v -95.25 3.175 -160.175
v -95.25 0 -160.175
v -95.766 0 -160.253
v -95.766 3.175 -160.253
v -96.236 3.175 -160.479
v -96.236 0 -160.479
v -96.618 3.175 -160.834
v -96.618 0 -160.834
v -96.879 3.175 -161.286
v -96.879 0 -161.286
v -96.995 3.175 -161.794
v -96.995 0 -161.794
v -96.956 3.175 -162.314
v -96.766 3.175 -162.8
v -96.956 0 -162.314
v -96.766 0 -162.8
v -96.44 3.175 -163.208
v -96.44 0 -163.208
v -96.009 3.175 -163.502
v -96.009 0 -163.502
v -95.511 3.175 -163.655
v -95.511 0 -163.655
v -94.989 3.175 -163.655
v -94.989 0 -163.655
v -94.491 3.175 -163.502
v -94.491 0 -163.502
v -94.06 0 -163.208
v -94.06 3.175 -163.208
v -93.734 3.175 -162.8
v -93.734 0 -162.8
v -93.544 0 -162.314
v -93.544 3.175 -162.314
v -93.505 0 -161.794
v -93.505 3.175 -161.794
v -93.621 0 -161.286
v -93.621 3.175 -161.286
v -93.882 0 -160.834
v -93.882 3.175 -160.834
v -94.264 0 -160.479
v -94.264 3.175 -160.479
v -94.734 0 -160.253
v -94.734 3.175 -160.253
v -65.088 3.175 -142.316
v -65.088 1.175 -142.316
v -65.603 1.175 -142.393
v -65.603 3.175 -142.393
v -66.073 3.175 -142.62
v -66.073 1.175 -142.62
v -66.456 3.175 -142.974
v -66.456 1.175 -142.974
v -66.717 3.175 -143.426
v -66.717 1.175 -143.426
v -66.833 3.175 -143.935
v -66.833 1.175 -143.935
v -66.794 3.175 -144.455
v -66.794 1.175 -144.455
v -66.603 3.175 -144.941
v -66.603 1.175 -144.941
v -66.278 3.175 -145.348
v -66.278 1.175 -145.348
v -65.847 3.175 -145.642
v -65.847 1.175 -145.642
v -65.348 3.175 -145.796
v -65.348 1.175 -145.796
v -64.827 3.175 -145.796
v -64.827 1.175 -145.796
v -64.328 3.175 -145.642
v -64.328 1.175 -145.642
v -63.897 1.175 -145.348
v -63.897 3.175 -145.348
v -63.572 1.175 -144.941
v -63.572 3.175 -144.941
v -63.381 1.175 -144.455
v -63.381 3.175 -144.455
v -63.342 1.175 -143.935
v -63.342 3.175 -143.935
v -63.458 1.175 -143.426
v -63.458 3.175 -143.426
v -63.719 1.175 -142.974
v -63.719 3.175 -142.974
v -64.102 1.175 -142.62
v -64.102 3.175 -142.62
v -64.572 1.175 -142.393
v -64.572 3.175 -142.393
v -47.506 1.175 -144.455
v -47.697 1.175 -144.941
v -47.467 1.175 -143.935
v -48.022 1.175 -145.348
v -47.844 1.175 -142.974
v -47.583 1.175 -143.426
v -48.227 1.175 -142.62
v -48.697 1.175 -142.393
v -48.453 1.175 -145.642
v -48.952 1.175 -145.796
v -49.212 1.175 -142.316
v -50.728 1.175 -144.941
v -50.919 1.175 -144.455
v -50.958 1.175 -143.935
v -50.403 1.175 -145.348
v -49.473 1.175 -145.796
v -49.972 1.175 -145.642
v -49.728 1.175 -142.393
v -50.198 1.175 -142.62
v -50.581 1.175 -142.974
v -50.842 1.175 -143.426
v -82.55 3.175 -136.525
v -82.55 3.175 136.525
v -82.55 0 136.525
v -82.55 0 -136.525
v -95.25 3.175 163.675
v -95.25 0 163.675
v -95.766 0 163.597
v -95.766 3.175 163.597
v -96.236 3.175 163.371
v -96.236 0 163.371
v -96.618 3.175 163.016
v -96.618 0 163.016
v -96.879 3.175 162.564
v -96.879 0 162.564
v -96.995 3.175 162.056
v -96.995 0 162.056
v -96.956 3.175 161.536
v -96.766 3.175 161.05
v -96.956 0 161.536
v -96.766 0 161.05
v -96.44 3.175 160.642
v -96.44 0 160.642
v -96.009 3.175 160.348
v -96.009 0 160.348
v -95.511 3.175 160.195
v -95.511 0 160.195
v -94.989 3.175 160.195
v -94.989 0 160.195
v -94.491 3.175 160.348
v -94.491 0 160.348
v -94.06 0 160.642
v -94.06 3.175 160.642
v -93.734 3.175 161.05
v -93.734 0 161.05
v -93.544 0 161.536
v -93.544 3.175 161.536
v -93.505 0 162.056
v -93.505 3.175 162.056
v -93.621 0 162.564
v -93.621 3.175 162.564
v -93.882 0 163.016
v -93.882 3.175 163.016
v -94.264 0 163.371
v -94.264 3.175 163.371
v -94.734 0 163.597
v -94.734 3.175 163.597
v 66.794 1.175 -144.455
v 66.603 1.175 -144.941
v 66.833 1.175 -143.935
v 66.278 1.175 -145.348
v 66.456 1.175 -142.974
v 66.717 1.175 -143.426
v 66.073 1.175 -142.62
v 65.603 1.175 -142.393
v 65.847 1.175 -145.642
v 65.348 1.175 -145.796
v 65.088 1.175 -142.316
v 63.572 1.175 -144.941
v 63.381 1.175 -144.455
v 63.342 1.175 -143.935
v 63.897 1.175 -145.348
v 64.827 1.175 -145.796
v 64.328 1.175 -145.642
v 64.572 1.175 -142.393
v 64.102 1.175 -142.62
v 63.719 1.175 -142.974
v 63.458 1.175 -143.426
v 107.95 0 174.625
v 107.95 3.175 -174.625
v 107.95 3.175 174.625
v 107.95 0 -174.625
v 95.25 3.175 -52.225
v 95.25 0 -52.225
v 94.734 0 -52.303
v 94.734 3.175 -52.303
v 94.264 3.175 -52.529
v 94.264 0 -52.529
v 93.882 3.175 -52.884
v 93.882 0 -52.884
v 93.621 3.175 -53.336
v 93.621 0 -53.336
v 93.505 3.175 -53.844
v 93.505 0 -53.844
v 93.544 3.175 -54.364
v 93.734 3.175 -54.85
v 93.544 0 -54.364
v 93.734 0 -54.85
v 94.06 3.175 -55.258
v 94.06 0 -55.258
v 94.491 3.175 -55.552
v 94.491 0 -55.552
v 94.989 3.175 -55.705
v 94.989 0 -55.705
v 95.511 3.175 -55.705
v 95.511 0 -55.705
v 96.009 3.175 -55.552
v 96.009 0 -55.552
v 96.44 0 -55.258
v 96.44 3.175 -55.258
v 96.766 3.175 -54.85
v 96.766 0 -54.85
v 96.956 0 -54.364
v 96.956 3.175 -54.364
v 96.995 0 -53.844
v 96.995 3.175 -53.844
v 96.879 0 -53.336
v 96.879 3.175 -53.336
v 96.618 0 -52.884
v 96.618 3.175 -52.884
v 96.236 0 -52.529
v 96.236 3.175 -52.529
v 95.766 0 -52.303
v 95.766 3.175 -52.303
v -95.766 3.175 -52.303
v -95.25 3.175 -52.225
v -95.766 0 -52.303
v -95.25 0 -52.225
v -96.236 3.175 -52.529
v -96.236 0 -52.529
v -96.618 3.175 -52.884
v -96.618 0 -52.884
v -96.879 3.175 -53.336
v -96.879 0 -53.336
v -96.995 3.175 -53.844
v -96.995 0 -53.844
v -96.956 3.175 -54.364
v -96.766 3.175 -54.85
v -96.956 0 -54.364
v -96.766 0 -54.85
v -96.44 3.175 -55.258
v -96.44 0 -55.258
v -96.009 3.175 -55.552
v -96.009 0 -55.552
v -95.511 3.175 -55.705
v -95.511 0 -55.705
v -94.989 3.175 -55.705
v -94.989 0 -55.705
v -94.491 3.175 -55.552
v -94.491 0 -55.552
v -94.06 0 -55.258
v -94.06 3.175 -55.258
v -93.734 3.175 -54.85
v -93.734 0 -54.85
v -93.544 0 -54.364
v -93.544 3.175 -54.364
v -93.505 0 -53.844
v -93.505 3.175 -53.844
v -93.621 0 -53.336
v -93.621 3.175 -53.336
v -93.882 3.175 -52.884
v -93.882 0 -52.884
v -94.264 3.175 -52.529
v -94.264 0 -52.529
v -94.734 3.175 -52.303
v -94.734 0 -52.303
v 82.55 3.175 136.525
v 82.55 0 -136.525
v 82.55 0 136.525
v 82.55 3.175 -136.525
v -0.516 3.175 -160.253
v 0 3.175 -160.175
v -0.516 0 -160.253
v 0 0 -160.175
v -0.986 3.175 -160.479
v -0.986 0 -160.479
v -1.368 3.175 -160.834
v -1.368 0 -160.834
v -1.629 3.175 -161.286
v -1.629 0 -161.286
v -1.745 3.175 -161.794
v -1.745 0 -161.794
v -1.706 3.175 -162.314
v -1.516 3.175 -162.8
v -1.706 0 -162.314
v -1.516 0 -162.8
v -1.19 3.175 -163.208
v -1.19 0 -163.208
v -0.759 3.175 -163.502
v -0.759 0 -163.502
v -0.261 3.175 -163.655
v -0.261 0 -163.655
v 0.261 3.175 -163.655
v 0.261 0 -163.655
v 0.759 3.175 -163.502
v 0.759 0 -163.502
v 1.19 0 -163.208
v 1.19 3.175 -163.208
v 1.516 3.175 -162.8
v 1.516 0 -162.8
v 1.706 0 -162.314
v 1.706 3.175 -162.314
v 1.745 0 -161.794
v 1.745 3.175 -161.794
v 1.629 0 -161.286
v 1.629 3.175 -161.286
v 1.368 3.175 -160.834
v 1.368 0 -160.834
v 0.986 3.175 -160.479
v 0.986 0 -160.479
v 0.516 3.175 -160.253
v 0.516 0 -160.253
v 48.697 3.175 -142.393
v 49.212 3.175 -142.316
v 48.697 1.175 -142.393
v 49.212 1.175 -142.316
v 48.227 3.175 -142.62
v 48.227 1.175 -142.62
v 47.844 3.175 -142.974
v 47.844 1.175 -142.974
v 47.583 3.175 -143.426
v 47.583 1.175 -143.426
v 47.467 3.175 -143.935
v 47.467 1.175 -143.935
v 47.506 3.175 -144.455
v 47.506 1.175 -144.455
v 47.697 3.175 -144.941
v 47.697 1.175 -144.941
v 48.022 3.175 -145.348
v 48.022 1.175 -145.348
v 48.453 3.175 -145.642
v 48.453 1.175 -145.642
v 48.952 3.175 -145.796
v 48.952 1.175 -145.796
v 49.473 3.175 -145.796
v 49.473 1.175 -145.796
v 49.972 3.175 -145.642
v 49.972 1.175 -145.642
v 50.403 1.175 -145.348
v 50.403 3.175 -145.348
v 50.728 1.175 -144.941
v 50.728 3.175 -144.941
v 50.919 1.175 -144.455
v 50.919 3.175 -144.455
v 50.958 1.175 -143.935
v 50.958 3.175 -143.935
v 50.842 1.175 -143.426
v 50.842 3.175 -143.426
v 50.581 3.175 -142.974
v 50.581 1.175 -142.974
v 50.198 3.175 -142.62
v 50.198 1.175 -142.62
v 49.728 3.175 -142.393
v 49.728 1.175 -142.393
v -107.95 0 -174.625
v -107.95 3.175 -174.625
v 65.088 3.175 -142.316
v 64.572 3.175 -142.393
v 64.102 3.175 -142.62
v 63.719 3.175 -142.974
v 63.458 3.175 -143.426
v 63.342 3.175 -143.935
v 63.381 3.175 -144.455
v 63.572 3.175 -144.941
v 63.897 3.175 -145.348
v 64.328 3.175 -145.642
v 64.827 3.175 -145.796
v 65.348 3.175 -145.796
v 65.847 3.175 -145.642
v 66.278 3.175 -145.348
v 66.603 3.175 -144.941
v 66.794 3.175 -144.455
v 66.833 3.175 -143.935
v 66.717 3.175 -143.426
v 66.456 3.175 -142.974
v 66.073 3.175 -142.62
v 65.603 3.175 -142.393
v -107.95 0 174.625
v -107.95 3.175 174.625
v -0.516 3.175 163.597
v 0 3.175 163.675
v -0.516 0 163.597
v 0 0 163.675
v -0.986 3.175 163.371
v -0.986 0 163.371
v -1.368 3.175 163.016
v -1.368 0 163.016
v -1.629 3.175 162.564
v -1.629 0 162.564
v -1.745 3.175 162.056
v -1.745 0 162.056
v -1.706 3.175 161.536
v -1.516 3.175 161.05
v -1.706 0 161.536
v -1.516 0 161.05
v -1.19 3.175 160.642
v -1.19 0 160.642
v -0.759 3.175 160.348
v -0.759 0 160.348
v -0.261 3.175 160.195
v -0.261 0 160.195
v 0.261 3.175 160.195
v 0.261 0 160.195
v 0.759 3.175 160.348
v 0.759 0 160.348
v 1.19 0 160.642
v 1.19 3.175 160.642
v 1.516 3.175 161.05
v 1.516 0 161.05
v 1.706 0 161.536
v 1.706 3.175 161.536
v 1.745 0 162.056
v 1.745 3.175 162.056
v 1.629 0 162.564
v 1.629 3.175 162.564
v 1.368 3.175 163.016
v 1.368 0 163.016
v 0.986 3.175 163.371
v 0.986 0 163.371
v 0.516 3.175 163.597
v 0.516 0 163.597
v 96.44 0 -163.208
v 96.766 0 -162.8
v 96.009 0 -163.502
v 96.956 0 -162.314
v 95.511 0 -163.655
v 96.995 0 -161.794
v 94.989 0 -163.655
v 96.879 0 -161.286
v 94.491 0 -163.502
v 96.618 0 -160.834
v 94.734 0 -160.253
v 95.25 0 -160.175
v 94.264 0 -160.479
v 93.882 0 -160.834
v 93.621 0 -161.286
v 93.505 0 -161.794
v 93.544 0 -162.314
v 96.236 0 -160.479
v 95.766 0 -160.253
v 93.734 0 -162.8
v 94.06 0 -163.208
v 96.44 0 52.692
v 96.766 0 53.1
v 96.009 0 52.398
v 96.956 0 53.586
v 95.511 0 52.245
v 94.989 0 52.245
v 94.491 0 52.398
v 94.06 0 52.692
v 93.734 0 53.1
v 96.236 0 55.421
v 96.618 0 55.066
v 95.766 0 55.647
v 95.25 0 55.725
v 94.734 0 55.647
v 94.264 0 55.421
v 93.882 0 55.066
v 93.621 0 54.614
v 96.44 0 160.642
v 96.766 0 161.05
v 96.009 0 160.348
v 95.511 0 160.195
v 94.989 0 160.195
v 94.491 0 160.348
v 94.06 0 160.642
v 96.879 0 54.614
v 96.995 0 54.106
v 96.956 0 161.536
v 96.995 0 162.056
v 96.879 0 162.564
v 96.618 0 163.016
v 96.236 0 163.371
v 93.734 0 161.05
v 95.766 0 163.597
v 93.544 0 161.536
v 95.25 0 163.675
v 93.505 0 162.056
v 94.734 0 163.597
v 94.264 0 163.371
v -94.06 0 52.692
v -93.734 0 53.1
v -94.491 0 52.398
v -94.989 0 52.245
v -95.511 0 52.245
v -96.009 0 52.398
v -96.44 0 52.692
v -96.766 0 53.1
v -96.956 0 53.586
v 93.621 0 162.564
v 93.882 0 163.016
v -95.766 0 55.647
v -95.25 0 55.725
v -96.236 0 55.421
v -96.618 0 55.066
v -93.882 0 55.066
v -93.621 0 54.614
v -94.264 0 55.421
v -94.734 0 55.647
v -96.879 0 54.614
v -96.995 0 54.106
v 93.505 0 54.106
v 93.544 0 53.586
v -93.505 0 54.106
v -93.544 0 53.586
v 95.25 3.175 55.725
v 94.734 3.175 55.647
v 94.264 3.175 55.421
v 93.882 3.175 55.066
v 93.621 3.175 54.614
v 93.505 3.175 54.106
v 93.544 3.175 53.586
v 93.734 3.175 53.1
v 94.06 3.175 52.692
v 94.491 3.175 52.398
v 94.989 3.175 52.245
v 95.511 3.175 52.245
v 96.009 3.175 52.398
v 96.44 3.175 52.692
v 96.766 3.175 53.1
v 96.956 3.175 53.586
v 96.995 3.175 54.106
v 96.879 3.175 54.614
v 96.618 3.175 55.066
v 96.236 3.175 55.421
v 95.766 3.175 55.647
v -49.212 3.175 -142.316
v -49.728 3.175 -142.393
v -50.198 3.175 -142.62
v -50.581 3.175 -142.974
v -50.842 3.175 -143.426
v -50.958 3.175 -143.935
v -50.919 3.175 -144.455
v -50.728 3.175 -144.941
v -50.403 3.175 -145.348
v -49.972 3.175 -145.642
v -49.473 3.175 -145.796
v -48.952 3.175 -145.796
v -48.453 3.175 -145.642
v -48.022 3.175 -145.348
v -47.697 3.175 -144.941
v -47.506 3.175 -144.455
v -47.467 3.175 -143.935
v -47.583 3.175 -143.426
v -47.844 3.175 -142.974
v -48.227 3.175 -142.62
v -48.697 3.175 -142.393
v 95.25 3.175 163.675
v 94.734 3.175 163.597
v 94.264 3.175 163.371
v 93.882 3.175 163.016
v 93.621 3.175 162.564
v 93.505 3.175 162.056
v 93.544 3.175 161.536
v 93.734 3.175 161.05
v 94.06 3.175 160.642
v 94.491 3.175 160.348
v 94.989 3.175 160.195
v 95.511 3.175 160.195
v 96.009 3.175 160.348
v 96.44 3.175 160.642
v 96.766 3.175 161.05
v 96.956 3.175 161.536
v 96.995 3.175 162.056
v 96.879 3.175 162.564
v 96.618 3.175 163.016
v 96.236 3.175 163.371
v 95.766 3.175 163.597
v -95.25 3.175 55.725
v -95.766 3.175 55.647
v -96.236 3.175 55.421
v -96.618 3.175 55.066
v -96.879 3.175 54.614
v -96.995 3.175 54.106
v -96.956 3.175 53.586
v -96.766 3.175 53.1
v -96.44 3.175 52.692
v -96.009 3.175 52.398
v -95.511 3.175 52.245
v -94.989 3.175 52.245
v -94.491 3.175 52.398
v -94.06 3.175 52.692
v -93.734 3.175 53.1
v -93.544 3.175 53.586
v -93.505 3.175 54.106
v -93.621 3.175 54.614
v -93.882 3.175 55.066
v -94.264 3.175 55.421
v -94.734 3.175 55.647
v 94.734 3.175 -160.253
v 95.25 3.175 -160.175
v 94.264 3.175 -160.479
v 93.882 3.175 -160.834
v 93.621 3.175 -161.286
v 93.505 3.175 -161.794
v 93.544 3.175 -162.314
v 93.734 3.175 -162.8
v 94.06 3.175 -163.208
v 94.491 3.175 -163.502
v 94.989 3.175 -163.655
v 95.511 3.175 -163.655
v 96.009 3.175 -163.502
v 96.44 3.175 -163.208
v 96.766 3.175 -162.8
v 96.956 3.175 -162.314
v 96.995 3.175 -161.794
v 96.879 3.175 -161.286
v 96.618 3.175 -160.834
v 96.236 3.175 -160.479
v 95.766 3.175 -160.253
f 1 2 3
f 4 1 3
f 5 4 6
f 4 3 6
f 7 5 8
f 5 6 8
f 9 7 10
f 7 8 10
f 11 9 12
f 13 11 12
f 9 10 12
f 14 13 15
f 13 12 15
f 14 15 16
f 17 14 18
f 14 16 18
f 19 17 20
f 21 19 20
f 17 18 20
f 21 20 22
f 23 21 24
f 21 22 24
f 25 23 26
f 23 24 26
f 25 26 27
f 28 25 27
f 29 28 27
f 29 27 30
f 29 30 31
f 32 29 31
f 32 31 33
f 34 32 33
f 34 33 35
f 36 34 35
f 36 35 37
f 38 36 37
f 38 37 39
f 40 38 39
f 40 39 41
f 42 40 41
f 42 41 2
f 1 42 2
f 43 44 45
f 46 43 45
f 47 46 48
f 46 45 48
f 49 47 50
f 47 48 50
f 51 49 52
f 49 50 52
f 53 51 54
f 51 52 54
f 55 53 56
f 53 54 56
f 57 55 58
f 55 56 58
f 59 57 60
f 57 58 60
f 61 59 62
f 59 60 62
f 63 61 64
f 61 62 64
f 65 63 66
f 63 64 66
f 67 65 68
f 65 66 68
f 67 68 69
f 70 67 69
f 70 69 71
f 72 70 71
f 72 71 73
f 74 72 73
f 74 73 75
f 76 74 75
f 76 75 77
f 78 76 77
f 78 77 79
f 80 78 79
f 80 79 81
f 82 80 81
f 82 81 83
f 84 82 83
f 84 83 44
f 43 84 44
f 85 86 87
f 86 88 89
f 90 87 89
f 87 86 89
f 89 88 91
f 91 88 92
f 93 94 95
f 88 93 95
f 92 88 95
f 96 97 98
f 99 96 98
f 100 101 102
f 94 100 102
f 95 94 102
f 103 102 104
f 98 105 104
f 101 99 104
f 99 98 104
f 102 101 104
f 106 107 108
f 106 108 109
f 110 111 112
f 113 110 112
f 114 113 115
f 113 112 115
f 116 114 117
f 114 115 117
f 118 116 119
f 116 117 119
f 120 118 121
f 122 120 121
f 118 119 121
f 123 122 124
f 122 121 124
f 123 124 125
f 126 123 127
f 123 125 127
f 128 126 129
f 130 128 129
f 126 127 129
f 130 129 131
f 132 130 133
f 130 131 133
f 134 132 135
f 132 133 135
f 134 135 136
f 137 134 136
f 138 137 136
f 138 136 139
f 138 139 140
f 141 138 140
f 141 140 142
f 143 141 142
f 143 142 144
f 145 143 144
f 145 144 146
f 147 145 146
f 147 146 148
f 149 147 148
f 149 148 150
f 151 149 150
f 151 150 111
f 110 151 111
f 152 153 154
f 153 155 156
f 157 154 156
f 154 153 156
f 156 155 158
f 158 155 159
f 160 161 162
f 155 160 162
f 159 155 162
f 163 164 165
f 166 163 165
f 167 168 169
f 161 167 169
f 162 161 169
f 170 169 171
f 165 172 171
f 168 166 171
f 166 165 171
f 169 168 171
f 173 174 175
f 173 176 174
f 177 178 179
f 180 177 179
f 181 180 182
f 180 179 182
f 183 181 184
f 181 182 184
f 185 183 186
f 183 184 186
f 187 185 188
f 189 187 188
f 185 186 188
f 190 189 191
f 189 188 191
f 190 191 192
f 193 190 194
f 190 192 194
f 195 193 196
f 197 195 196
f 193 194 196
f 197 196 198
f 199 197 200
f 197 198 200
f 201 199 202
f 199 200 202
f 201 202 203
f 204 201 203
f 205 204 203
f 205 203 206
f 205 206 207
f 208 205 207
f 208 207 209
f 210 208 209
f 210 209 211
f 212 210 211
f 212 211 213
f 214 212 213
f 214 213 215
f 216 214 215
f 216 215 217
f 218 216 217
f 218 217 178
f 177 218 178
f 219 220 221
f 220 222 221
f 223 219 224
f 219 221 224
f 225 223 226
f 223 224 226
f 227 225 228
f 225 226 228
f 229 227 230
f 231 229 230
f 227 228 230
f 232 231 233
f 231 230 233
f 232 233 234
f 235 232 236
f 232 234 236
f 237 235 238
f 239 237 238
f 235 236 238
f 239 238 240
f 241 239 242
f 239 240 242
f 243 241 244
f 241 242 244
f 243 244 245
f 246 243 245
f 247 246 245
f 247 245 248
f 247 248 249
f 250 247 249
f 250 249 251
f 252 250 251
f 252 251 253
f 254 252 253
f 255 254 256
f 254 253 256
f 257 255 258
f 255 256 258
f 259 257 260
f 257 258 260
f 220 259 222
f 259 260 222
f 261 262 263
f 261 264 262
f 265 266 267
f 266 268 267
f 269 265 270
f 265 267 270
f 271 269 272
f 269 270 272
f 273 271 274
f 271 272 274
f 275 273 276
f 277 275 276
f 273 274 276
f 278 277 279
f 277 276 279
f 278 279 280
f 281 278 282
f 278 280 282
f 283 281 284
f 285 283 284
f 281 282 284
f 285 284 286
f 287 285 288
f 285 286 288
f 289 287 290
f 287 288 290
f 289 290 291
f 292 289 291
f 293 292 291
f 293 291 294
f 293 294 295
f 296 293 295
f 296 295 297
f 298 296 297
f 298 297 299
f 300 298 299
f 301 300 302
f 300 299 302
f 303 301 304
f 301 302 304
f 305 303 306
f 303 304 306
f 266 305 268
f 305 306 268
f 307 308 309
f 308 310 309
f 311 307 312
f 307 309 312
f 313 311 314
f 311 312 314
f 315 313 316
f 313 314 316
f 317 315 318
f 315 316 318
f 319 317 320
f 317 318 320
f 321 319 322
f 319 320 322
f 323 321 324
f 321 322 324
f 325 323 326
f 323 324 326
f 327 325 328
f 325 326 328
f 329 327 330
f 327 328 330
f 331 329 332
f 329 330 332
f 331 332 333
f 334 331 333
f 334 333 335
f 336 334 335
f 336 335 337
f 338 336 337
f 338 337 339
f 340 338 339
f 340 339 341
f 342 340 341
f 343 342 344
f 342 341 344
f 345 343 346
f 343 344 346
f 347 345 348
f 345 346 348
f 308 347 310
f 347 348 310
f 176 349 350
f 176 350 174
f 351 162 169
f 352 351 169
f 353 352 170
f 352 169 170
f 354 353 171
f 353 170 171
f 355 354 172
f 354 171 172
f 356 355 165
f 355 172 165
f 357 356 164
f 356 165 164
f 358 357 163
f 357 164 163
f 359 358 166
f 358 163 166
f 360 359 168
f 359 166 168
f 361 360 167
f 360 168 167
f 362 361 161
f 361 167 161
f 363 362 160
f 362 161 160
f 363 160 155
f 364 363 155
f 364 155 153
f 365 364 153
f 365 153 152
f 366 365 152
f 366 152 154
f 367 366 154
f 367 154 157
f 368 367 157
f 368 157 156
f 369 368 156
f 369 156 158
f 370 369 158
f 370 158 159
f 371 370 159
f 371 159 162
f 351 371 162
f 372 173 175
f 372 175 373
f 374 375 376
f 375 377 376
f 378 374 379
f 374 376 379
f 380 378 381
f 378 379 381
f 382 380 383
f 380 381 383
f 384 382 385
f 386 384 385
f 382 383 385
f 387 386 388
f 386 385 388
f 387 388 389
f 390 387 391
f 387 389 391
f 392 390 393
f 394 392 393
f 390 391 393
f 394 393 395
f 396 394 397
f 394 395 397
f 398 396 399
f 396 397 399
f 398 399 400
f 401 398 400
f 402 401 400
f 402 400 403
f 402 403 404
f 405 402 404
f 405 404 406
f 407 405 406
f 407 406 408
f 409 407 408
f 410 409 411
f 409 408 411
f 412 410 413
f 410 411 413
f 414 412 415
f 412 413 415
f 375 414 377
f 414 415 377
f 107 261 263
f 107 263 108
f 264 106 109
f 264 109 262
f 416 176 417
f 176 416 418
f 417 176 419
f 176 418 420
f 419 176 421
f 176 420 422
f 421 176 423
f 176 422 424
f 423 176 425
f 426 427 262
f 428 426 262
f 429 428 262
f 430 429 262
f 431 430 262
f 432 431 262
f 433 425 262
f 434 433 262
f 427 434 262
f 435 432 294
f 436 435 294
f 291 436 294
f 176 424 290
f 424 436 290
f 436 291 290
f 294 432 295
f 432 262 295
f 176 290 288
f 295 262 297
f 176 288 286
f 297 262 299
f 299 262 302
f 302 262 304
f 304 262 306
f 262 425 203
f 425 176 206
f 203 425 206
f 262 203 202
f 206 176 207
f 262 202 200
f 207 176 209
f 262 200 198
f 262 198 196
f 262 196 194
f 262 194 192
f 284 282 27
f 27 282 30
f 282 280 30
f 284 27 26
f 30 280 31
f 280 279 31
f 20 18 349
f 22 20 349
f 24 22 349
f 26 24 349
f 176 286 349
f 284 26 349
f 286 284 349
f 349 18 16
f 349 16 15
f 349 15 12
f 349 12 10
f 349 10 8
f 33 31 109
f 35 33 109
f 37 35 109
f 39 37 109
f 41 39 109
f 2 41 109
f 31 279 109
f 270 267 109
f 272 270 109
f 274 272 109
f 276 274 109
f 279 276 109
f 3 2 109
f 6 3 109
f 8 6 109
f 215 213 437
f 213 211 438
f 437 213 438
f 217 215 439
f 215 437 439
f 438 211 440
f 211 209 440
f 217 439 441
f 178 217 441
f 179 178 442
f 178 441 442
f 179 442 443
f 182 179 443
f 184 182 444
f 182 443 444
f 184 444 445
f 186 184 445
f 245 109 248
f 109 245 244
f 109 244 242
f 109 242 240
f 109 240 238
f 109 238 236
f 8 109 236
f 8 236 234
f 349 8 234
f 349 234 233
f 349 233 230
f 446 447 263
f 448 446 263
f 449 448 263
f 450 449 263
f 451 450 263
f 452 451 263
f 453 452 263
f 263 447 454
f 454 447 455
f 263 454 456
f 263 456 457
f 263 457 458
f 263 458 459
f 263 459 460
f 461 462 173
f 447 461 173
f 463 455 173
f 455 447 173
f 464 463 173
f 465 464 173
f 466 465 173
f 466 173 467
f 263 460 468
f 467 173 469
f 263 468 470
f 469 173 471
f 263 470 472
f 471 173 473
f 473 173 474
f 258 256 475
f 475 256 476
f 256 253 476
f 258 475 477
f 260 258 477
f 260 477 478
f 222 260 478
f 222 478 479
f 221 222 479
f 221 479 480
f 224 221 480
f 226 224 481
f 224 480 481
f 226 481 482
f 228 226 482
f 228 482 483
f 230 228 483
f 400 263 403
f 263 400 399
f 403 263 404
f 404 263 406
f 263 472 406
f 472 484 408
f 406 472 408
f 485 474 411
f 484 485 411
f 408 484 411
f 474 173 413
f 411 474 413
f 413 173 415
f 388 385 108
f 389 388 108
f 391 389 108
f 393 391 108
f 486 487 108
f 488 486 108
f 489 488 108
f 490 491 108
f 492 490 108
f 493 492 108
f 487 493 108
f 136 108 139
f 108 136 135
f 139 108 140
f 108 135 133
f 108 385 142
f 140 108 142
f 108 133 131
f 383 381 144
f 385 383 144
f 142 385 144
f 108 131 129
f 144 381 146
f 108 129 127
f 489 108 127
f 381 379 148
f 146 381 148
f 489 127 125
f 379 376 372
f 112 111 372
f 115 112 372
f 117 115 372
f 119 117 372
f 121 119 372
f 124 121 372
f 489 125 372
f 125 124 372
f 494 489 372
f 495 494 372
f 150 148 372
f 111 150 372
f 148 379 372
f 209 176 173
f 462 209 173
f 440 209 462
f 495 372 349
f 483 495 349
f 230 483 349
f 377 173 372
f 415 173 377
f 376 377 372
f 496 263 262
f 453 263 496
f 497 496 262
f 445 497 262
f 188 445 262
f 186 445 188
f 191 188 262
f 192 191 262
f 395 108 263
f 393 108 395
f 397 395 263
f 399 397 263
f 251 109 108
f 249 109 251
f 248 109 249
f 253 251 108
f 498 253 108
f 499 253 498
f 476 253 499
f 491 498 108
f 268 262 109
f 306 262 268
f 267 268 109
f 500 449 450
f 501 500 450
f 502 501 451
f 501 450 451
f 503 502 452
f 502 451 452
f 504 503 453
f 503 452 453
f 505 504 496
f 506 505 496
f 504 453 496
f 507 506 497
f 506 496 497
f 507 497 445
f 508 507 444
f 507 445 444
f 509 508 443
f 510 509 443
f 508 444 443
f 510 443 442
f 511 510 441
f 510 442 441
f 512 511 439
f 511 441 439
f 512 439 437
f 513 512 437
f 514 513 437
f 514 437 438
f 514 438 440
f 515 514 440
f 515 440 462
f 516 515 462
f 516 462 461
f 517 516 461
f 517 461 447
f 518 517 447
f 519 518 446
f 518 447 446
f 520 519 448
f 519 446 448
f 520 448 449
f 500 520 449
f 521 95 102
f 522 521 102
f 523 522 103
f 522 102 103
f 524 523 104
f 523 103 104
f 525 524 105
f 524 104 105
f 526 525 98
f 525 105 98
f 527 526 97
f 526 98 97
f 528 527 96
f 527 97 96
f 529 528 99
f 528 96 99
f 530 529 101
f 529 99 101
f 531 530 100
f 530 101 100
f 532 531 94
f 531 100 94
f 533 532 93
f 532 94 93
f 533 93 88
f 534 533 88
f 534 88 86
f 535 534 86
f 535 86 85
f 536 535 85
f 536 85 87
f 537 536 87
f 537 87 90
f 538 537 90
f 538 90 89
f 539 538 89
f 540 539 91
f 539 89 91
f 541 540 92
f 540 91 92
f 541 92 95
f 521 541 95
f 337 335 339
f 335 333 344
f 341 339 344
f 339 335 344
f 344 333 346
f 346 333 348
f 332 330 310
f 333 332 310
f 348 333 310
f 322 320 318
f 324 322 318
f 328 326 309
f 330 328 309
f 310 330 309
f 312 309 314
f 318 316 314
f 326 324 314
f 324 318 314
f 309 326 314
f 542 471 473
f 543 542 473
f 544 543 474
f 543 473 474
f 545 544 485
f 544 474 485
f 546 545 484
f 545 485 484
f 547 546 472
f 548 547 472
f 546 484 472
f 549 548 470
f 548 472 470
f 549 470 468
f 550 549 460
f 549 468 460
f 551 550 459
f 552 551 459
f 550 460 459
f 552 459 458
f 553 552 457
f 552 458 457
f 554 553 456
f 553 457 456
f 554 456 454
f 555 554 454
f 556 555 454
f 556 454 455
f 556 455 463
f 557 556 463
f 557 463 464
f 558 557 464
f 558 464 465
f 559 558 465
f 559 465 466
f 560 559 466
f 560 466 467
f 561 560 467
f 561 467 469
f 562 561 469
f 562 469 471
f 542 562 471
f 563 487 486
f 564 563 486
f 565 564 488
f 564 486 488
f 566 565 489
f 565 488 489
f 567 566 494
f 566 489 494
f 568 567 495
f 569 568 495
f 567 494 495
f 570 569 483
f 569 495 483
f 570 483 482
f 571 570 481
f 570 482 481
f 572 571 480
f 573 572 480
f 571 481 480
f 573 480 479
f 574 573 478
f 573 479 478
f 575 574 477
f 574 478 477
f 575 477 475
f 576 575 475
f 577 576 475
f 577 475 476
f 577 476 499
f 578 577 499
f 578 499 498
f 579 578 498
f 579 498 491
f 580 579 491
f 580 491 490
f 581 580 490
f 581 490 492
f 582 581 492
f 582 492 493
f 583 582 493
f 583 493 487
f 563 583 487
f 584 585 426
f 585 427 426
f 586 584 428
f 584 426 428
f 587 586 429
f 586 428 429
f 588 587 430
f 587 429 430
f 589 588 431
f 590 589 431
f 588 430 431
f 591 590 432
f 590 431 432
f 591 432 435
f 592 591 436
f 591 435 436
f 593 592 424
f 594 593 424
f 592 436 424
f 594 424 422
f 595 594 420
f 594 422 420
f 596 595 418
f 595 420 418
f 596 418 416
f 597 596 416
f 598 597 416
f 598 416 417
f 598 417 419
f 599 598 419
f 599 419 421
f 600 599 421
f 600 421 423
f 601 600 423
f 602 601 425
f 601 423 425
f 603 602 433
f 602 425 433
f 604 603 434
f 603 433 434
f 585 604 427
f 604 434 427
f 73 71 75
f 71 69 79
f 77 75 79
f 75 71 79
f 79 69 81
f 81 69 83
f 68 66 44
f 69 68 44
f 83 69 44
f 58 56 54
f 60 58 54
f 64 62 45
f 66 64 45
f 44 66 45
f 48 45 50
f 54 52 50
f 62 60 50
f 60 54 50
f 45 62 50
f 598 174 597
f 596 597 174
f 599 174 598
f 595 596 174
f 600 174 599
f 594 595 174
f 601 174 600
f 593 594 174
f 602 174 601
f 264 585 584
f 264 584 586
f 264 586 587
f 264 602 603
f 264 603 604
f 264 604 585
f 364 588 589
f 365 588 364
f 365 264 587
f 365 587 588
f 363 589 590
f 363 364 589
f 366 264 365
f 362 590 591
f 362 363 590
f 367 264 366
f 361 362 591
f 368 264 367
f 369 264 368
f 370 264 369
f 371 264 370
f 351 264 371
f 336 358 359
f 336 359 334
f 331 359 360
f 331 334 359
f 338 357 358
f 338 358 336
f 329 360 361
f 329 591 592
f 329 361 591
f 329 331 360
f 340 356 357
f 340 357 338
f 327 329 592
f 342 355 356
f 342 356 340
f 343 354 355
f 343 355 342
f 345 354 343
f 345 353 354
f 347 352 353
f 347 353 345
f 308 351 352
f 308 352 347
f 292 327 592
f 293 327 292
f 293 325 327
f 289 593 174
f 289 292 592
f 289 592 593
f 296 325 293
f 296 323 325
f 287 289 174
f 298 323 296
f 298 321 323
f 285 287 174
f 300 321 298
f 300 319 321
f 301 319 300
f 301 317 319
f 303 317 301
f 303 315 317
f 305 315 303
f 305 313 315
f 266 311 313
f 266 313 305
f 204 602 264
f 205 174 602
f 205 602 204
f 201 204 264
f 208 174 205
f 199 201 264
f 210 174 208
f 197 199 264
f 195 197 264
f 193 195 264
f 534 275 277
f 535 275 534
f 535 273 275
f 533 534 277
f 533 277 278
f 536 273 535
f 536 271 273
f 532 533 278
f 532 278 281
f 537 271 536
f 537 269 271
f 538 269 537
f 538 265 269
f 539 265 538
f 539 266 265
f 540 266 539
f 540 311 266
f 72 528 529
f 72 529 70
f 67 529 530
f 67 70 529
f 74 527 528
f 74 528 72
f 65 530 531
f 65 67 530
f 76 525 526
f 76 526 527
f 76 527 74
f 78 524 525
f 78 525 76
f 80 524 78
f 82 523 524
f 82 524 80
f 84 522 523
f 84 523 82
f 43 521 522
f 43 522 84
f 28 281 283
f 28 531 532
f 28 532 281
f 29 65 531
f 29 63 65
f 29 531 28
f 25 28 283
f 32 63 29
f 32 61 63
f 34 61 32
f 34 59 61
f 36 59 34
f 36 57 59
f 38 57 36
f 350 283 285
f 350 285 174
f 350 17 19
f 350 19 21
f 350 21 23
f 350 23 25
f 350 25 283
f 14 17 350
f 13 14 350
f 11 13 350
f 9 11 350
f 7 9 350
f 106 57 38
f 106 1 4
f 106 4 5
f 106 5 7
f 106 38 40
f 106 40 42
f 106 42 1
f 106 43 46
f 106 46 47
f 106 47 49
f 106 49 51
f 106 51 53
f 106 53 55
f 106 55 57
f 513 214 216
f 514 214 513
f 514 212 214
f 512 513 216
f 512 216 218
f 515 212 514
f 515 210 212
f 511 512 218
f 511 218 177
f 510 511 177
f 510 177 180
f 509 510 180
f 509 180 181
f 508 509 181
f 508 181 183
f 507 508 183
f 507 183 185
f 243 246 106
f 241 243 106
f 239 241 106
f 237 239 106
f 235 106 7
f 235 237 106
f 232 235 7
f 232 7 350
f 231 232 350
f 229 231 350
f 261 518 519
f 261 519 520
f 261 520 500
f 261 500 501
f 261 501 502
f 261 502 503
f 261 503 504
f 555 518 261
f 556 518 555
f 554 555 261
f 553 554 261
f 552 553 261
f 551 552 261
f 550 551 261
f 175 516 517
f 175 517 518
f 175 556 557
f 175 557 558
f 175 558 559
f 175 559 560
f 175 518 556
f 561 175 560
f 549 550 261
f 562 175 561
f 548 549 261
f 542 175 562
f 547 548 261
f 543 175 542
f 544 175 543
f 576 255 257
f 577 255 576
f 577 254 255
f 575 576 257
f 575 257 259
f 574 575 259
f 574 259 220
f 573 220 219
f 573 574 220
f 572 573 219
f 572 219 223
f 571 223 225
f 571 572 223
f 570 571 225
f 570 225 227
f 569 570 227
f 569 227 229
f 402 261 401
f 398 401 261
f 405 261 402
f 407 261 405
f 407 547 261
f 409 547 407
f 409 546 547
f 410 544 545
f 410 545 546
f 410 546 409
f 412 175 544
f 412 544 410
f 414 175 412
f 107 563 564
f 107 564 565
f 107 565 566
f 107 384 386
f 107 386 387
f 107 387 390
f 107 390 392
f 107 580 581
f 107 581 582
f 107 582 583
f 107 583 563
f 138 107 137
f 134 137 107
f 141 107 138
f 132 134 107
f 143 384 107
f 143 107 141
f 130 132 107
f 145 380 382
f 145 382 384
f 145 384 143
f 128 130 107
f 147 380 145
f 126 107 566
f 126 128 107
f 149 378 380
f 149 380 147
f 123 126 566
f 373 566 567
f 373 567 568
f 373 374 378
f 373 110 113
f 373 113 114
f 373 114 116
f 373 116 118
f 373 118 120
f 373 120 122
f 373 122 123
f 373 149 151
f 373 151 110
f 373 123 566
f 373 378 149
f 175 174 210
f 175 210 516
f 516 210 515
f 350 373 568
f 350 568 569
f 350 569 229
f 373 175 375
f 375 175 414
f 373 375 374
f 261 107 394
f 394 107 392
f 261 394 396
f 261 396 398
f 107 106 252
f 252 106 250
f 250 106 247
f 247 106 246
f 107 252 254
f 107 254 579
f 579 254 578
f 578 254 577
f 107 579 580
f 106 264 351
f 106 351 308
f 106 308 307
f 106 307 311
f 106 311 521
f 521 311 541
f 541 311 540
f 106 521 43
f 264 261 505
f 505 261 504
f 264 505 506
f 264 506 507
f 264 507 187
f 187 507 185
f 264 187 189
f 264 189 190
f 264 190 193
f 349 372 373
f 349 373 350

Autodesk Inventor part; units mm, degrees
ref_plane "YZ Plane" through (0, 0, 0) normal (1, 0, 0) x (0, 1, 0)
ref_plane "XZ Plane" through (0, 0, 0) normal (0, 1, 0) x (-1, 0, 0)
ref_plane "XY Plane" through (0, 0, 0) normal (0, 0, 1) x (1, 0, 0)
sketch "Sketch1" plane through (0, 0, 0) normal (0, 1, 0) x (-1, 0, 0)
  line L0 (107.95, -174.625) -> (-107.95, -174.625)
  line L1 (-107.95, -174.625) -> (-107.95, 174.625)
  line L2 (-107.95, 174.625) -> (107.95, 174.625)
  line L3 (107.95, 174.625) -> (107.95, -174.625)
  line L4 (107.95, -174.625) -> (-107.95, 174.625) construction
  line L5 (-107.95, -174.625) -> (107.95, 174.625) construction
  point P0 (0, 0)
  dimension "d0" = 215.9
  dimension "d1" = 349.25
extrude "Thickness" add sketch "Sketch1" along normal blind 3.175
sketch "Cutout Sketch" plane through (0, 3.175, 0) normal (0, 1, 0) x (1, 0, 0)
  line L0 (107.95, -174.625) -> (107.95, 174.625) projected
  line L1 (107.95, 174.625) -> (-107.95, 174.625) projected
  line L2 (-107.95, 174.625) -> (-107.95, -174.625) projected
  line L3 (-107.95, -174.625) -> (107.95, -174.625) projected
  line L4 (-82.55, 136.525) -> (82.55, 136.525)
  line L5 (82.55, 136.525) -> (82.55, -136.525)
  line L6 (82.55, -136.525) -> (-82.55, -136.525)
  line L7 (-82.55, -136.525) -> (-82.55, 136.525)
  point P0 (0, 0)
  dimension "d4" = 25.4
  dimension "d5" = 38.1
  dimension "d8" = 38.1
  dimension "d9" = 25.4
extrude "Cutout" cut sketch "Cutout Sketch" against normal blind 25.4 contours L4 L5 L6 L7
sketch "Sketch3" plane through (0, 3.175, 0) normal (0, 1, 0) x (1, 0, 0)
  line L0 (44.45, 149.225) -> (44.45, 137.9537) projected
  line L1 (44.45, 137.9537) -> (49.1744, 137.9537) projected
  line L2 (49.1744, 137.9537) -> (49.1744, 136.525) projected
  line L3 (49.1744, 136.525) -> (54.737, 136.525) projected
  line L4 (54.737, 136.525) -> (54.737, 137.9537) projected
  line L5 (54.737, 137.9537) -> (59.563, 137.9537) projected
  line L6 (59.563, 137.9537) -> (59.563, 136.525) projected
  line L7 (59.563, 136.525) -> (65.1256, 136.525) projected
  line L8 (65.1256, 136.525) -> (65.1256, 137.9537) projected
  line L9 (65.1256, 137.9537) -> (69.85, 137.9537) projected
  line L10 (69.85, 149.225) -> (69.85, 137.9537) projected
  line L11 (44.45, 149.225) -> (69.85, 149.225) projected
  circle A0 centre (65.0875, 144.0656) radius 2.0955 projected
  circle A1 centre (49.2125, 144.0656) radius 2.0955 projected
  line L12 (-69.85, 149.225) -> (-69.85, 137.9537) projected
  line L13 (-69.85, 137.9537) -> (-65.1256, 137.9537) projected
  line L14 (-65.1256, 137.9537) -> (-65.1256, 136.525) projected
  line L15 (-65.1256, 136.525) -> (-59.563, 136.525) projected
  line L16 (-59.563, 136.525) -> (-59.563, 137.9537) projected
  line L17 (-59.563, 137.9537) -> (-54.737, 137.9537) projected
  line L18 (-54.737, 137.9537) -> (-54.737, 136.525) projected
  line L19 (-54.737, 136.525) -> (-49.1744, 136.525) projected
  line L20 (-49.1744, 136.525) -> (-49.1744, 137.9537) projected
  line L21 (-49.1744, 137.9537) -> (-44.45, 137.9537) projected
  line L22 (-44.45, 149.225) -> (-44.45, 137.9537) projected
  line L23 (-69.85, 149.225) -> (-44.45, 149.225) projected
  circle A2 centre (-49.2125, 144.0656) radius 2.0955 projected
  circle A3 centre (-65.0875, 144.0656) radius 2.0955 projected
  point P0 (0, 0)
hole "Hole1" at (65.0875, 3.175, -144.0656) at (49.2125, 3.175, -144.0656) at (-65.0875, 3.175, -144.0656) at (-49.2125, 3.175, -144.0656) direction (0, -1, 0) diameter 3.5 depth 2
sketch "Sketch4" plane through (0, 3.175, 0) normal (0, 1, 0) x (1, 0, 0)
  circle A0 centre (-65.0875, 144.0656) radius 1.75 projected
  circle A1 centre (65.0875, 144.0656) radius 1.75 projected
  circle A2 centre (49.2125, 144.0656) radius 1.75 projected
  circle A3 centre (-49.2125, 144.0656) radius 1.75 projected
  line L0 (-82.55, 136.525) -> (82.55, 136.525) projected
  line L1 (82.55, 136.525) -> (82.55, -136.525) projected
  line L2 (82.55, -136.525) -> (-82.55, -136.525) projected
  line L3 (-82.55, -136.525) -> (-82.55, 136.525) projected
  line L4 (107.95, 174.625) -> (-107.95, 174.625) projected
  line L5 (-107.95, 174.625) -> (-107.95, -174.625) projected
  line L6 (-107.95, -174.625) -> (107.95, -174.625) projected
  line L7 (107.95, -174.625) -> (107.95, 174.625) projected
  point P0 (0, 0)
  point P1 (-95.25, -161.925)
  point P2 (-95.25, 161.925)
  point P3 (95.25, -161.925)
  point P4 (95.25, 161.925)
  point P5 (95.25, -53.975)
  point P6 (95.25, 53.975)
  point P7 (0, -161.925)
  point P8 (0, 161.925)
  point P9 (-95.25, -53.975)
  point P10 (-95.25, 53.975)
  point P11 (0, -136.525)
  point P12 (0, 136.525)
  dimension "d17" = 12.7
  dimension "d18" = 12.7
  dimension "d19" = 12.7
  dimension "d20" = 323.85
  dimension "d21" = 107.95
  dimension "d22" = 107.95
  dimension "d23" = 12.7
hole "Hole2" at (-95.25, 3.175, 161.925) at (-95.25, 3.175, -161.925) at (95.25, 3.175, 161.925) at (95.25, 3.175, -161.925) at (95.25, 3.175, 53.975) at (95.25, 3.175, -53.975) at (0, 3.175, 161.925) at (0, 3.175, -161.925) at (-95.25, 3.175, 53.975) at (-95.25, 3.175, -53.975) direction (0, -1, 0) diameter 3.5 end through all
equation "\"d21\" = 0.333333 * d20"
equation "\"d22\" = d21"
properties part number "NASA-20-EBOX-T2-01" material "Polycarbonate, Clear"
